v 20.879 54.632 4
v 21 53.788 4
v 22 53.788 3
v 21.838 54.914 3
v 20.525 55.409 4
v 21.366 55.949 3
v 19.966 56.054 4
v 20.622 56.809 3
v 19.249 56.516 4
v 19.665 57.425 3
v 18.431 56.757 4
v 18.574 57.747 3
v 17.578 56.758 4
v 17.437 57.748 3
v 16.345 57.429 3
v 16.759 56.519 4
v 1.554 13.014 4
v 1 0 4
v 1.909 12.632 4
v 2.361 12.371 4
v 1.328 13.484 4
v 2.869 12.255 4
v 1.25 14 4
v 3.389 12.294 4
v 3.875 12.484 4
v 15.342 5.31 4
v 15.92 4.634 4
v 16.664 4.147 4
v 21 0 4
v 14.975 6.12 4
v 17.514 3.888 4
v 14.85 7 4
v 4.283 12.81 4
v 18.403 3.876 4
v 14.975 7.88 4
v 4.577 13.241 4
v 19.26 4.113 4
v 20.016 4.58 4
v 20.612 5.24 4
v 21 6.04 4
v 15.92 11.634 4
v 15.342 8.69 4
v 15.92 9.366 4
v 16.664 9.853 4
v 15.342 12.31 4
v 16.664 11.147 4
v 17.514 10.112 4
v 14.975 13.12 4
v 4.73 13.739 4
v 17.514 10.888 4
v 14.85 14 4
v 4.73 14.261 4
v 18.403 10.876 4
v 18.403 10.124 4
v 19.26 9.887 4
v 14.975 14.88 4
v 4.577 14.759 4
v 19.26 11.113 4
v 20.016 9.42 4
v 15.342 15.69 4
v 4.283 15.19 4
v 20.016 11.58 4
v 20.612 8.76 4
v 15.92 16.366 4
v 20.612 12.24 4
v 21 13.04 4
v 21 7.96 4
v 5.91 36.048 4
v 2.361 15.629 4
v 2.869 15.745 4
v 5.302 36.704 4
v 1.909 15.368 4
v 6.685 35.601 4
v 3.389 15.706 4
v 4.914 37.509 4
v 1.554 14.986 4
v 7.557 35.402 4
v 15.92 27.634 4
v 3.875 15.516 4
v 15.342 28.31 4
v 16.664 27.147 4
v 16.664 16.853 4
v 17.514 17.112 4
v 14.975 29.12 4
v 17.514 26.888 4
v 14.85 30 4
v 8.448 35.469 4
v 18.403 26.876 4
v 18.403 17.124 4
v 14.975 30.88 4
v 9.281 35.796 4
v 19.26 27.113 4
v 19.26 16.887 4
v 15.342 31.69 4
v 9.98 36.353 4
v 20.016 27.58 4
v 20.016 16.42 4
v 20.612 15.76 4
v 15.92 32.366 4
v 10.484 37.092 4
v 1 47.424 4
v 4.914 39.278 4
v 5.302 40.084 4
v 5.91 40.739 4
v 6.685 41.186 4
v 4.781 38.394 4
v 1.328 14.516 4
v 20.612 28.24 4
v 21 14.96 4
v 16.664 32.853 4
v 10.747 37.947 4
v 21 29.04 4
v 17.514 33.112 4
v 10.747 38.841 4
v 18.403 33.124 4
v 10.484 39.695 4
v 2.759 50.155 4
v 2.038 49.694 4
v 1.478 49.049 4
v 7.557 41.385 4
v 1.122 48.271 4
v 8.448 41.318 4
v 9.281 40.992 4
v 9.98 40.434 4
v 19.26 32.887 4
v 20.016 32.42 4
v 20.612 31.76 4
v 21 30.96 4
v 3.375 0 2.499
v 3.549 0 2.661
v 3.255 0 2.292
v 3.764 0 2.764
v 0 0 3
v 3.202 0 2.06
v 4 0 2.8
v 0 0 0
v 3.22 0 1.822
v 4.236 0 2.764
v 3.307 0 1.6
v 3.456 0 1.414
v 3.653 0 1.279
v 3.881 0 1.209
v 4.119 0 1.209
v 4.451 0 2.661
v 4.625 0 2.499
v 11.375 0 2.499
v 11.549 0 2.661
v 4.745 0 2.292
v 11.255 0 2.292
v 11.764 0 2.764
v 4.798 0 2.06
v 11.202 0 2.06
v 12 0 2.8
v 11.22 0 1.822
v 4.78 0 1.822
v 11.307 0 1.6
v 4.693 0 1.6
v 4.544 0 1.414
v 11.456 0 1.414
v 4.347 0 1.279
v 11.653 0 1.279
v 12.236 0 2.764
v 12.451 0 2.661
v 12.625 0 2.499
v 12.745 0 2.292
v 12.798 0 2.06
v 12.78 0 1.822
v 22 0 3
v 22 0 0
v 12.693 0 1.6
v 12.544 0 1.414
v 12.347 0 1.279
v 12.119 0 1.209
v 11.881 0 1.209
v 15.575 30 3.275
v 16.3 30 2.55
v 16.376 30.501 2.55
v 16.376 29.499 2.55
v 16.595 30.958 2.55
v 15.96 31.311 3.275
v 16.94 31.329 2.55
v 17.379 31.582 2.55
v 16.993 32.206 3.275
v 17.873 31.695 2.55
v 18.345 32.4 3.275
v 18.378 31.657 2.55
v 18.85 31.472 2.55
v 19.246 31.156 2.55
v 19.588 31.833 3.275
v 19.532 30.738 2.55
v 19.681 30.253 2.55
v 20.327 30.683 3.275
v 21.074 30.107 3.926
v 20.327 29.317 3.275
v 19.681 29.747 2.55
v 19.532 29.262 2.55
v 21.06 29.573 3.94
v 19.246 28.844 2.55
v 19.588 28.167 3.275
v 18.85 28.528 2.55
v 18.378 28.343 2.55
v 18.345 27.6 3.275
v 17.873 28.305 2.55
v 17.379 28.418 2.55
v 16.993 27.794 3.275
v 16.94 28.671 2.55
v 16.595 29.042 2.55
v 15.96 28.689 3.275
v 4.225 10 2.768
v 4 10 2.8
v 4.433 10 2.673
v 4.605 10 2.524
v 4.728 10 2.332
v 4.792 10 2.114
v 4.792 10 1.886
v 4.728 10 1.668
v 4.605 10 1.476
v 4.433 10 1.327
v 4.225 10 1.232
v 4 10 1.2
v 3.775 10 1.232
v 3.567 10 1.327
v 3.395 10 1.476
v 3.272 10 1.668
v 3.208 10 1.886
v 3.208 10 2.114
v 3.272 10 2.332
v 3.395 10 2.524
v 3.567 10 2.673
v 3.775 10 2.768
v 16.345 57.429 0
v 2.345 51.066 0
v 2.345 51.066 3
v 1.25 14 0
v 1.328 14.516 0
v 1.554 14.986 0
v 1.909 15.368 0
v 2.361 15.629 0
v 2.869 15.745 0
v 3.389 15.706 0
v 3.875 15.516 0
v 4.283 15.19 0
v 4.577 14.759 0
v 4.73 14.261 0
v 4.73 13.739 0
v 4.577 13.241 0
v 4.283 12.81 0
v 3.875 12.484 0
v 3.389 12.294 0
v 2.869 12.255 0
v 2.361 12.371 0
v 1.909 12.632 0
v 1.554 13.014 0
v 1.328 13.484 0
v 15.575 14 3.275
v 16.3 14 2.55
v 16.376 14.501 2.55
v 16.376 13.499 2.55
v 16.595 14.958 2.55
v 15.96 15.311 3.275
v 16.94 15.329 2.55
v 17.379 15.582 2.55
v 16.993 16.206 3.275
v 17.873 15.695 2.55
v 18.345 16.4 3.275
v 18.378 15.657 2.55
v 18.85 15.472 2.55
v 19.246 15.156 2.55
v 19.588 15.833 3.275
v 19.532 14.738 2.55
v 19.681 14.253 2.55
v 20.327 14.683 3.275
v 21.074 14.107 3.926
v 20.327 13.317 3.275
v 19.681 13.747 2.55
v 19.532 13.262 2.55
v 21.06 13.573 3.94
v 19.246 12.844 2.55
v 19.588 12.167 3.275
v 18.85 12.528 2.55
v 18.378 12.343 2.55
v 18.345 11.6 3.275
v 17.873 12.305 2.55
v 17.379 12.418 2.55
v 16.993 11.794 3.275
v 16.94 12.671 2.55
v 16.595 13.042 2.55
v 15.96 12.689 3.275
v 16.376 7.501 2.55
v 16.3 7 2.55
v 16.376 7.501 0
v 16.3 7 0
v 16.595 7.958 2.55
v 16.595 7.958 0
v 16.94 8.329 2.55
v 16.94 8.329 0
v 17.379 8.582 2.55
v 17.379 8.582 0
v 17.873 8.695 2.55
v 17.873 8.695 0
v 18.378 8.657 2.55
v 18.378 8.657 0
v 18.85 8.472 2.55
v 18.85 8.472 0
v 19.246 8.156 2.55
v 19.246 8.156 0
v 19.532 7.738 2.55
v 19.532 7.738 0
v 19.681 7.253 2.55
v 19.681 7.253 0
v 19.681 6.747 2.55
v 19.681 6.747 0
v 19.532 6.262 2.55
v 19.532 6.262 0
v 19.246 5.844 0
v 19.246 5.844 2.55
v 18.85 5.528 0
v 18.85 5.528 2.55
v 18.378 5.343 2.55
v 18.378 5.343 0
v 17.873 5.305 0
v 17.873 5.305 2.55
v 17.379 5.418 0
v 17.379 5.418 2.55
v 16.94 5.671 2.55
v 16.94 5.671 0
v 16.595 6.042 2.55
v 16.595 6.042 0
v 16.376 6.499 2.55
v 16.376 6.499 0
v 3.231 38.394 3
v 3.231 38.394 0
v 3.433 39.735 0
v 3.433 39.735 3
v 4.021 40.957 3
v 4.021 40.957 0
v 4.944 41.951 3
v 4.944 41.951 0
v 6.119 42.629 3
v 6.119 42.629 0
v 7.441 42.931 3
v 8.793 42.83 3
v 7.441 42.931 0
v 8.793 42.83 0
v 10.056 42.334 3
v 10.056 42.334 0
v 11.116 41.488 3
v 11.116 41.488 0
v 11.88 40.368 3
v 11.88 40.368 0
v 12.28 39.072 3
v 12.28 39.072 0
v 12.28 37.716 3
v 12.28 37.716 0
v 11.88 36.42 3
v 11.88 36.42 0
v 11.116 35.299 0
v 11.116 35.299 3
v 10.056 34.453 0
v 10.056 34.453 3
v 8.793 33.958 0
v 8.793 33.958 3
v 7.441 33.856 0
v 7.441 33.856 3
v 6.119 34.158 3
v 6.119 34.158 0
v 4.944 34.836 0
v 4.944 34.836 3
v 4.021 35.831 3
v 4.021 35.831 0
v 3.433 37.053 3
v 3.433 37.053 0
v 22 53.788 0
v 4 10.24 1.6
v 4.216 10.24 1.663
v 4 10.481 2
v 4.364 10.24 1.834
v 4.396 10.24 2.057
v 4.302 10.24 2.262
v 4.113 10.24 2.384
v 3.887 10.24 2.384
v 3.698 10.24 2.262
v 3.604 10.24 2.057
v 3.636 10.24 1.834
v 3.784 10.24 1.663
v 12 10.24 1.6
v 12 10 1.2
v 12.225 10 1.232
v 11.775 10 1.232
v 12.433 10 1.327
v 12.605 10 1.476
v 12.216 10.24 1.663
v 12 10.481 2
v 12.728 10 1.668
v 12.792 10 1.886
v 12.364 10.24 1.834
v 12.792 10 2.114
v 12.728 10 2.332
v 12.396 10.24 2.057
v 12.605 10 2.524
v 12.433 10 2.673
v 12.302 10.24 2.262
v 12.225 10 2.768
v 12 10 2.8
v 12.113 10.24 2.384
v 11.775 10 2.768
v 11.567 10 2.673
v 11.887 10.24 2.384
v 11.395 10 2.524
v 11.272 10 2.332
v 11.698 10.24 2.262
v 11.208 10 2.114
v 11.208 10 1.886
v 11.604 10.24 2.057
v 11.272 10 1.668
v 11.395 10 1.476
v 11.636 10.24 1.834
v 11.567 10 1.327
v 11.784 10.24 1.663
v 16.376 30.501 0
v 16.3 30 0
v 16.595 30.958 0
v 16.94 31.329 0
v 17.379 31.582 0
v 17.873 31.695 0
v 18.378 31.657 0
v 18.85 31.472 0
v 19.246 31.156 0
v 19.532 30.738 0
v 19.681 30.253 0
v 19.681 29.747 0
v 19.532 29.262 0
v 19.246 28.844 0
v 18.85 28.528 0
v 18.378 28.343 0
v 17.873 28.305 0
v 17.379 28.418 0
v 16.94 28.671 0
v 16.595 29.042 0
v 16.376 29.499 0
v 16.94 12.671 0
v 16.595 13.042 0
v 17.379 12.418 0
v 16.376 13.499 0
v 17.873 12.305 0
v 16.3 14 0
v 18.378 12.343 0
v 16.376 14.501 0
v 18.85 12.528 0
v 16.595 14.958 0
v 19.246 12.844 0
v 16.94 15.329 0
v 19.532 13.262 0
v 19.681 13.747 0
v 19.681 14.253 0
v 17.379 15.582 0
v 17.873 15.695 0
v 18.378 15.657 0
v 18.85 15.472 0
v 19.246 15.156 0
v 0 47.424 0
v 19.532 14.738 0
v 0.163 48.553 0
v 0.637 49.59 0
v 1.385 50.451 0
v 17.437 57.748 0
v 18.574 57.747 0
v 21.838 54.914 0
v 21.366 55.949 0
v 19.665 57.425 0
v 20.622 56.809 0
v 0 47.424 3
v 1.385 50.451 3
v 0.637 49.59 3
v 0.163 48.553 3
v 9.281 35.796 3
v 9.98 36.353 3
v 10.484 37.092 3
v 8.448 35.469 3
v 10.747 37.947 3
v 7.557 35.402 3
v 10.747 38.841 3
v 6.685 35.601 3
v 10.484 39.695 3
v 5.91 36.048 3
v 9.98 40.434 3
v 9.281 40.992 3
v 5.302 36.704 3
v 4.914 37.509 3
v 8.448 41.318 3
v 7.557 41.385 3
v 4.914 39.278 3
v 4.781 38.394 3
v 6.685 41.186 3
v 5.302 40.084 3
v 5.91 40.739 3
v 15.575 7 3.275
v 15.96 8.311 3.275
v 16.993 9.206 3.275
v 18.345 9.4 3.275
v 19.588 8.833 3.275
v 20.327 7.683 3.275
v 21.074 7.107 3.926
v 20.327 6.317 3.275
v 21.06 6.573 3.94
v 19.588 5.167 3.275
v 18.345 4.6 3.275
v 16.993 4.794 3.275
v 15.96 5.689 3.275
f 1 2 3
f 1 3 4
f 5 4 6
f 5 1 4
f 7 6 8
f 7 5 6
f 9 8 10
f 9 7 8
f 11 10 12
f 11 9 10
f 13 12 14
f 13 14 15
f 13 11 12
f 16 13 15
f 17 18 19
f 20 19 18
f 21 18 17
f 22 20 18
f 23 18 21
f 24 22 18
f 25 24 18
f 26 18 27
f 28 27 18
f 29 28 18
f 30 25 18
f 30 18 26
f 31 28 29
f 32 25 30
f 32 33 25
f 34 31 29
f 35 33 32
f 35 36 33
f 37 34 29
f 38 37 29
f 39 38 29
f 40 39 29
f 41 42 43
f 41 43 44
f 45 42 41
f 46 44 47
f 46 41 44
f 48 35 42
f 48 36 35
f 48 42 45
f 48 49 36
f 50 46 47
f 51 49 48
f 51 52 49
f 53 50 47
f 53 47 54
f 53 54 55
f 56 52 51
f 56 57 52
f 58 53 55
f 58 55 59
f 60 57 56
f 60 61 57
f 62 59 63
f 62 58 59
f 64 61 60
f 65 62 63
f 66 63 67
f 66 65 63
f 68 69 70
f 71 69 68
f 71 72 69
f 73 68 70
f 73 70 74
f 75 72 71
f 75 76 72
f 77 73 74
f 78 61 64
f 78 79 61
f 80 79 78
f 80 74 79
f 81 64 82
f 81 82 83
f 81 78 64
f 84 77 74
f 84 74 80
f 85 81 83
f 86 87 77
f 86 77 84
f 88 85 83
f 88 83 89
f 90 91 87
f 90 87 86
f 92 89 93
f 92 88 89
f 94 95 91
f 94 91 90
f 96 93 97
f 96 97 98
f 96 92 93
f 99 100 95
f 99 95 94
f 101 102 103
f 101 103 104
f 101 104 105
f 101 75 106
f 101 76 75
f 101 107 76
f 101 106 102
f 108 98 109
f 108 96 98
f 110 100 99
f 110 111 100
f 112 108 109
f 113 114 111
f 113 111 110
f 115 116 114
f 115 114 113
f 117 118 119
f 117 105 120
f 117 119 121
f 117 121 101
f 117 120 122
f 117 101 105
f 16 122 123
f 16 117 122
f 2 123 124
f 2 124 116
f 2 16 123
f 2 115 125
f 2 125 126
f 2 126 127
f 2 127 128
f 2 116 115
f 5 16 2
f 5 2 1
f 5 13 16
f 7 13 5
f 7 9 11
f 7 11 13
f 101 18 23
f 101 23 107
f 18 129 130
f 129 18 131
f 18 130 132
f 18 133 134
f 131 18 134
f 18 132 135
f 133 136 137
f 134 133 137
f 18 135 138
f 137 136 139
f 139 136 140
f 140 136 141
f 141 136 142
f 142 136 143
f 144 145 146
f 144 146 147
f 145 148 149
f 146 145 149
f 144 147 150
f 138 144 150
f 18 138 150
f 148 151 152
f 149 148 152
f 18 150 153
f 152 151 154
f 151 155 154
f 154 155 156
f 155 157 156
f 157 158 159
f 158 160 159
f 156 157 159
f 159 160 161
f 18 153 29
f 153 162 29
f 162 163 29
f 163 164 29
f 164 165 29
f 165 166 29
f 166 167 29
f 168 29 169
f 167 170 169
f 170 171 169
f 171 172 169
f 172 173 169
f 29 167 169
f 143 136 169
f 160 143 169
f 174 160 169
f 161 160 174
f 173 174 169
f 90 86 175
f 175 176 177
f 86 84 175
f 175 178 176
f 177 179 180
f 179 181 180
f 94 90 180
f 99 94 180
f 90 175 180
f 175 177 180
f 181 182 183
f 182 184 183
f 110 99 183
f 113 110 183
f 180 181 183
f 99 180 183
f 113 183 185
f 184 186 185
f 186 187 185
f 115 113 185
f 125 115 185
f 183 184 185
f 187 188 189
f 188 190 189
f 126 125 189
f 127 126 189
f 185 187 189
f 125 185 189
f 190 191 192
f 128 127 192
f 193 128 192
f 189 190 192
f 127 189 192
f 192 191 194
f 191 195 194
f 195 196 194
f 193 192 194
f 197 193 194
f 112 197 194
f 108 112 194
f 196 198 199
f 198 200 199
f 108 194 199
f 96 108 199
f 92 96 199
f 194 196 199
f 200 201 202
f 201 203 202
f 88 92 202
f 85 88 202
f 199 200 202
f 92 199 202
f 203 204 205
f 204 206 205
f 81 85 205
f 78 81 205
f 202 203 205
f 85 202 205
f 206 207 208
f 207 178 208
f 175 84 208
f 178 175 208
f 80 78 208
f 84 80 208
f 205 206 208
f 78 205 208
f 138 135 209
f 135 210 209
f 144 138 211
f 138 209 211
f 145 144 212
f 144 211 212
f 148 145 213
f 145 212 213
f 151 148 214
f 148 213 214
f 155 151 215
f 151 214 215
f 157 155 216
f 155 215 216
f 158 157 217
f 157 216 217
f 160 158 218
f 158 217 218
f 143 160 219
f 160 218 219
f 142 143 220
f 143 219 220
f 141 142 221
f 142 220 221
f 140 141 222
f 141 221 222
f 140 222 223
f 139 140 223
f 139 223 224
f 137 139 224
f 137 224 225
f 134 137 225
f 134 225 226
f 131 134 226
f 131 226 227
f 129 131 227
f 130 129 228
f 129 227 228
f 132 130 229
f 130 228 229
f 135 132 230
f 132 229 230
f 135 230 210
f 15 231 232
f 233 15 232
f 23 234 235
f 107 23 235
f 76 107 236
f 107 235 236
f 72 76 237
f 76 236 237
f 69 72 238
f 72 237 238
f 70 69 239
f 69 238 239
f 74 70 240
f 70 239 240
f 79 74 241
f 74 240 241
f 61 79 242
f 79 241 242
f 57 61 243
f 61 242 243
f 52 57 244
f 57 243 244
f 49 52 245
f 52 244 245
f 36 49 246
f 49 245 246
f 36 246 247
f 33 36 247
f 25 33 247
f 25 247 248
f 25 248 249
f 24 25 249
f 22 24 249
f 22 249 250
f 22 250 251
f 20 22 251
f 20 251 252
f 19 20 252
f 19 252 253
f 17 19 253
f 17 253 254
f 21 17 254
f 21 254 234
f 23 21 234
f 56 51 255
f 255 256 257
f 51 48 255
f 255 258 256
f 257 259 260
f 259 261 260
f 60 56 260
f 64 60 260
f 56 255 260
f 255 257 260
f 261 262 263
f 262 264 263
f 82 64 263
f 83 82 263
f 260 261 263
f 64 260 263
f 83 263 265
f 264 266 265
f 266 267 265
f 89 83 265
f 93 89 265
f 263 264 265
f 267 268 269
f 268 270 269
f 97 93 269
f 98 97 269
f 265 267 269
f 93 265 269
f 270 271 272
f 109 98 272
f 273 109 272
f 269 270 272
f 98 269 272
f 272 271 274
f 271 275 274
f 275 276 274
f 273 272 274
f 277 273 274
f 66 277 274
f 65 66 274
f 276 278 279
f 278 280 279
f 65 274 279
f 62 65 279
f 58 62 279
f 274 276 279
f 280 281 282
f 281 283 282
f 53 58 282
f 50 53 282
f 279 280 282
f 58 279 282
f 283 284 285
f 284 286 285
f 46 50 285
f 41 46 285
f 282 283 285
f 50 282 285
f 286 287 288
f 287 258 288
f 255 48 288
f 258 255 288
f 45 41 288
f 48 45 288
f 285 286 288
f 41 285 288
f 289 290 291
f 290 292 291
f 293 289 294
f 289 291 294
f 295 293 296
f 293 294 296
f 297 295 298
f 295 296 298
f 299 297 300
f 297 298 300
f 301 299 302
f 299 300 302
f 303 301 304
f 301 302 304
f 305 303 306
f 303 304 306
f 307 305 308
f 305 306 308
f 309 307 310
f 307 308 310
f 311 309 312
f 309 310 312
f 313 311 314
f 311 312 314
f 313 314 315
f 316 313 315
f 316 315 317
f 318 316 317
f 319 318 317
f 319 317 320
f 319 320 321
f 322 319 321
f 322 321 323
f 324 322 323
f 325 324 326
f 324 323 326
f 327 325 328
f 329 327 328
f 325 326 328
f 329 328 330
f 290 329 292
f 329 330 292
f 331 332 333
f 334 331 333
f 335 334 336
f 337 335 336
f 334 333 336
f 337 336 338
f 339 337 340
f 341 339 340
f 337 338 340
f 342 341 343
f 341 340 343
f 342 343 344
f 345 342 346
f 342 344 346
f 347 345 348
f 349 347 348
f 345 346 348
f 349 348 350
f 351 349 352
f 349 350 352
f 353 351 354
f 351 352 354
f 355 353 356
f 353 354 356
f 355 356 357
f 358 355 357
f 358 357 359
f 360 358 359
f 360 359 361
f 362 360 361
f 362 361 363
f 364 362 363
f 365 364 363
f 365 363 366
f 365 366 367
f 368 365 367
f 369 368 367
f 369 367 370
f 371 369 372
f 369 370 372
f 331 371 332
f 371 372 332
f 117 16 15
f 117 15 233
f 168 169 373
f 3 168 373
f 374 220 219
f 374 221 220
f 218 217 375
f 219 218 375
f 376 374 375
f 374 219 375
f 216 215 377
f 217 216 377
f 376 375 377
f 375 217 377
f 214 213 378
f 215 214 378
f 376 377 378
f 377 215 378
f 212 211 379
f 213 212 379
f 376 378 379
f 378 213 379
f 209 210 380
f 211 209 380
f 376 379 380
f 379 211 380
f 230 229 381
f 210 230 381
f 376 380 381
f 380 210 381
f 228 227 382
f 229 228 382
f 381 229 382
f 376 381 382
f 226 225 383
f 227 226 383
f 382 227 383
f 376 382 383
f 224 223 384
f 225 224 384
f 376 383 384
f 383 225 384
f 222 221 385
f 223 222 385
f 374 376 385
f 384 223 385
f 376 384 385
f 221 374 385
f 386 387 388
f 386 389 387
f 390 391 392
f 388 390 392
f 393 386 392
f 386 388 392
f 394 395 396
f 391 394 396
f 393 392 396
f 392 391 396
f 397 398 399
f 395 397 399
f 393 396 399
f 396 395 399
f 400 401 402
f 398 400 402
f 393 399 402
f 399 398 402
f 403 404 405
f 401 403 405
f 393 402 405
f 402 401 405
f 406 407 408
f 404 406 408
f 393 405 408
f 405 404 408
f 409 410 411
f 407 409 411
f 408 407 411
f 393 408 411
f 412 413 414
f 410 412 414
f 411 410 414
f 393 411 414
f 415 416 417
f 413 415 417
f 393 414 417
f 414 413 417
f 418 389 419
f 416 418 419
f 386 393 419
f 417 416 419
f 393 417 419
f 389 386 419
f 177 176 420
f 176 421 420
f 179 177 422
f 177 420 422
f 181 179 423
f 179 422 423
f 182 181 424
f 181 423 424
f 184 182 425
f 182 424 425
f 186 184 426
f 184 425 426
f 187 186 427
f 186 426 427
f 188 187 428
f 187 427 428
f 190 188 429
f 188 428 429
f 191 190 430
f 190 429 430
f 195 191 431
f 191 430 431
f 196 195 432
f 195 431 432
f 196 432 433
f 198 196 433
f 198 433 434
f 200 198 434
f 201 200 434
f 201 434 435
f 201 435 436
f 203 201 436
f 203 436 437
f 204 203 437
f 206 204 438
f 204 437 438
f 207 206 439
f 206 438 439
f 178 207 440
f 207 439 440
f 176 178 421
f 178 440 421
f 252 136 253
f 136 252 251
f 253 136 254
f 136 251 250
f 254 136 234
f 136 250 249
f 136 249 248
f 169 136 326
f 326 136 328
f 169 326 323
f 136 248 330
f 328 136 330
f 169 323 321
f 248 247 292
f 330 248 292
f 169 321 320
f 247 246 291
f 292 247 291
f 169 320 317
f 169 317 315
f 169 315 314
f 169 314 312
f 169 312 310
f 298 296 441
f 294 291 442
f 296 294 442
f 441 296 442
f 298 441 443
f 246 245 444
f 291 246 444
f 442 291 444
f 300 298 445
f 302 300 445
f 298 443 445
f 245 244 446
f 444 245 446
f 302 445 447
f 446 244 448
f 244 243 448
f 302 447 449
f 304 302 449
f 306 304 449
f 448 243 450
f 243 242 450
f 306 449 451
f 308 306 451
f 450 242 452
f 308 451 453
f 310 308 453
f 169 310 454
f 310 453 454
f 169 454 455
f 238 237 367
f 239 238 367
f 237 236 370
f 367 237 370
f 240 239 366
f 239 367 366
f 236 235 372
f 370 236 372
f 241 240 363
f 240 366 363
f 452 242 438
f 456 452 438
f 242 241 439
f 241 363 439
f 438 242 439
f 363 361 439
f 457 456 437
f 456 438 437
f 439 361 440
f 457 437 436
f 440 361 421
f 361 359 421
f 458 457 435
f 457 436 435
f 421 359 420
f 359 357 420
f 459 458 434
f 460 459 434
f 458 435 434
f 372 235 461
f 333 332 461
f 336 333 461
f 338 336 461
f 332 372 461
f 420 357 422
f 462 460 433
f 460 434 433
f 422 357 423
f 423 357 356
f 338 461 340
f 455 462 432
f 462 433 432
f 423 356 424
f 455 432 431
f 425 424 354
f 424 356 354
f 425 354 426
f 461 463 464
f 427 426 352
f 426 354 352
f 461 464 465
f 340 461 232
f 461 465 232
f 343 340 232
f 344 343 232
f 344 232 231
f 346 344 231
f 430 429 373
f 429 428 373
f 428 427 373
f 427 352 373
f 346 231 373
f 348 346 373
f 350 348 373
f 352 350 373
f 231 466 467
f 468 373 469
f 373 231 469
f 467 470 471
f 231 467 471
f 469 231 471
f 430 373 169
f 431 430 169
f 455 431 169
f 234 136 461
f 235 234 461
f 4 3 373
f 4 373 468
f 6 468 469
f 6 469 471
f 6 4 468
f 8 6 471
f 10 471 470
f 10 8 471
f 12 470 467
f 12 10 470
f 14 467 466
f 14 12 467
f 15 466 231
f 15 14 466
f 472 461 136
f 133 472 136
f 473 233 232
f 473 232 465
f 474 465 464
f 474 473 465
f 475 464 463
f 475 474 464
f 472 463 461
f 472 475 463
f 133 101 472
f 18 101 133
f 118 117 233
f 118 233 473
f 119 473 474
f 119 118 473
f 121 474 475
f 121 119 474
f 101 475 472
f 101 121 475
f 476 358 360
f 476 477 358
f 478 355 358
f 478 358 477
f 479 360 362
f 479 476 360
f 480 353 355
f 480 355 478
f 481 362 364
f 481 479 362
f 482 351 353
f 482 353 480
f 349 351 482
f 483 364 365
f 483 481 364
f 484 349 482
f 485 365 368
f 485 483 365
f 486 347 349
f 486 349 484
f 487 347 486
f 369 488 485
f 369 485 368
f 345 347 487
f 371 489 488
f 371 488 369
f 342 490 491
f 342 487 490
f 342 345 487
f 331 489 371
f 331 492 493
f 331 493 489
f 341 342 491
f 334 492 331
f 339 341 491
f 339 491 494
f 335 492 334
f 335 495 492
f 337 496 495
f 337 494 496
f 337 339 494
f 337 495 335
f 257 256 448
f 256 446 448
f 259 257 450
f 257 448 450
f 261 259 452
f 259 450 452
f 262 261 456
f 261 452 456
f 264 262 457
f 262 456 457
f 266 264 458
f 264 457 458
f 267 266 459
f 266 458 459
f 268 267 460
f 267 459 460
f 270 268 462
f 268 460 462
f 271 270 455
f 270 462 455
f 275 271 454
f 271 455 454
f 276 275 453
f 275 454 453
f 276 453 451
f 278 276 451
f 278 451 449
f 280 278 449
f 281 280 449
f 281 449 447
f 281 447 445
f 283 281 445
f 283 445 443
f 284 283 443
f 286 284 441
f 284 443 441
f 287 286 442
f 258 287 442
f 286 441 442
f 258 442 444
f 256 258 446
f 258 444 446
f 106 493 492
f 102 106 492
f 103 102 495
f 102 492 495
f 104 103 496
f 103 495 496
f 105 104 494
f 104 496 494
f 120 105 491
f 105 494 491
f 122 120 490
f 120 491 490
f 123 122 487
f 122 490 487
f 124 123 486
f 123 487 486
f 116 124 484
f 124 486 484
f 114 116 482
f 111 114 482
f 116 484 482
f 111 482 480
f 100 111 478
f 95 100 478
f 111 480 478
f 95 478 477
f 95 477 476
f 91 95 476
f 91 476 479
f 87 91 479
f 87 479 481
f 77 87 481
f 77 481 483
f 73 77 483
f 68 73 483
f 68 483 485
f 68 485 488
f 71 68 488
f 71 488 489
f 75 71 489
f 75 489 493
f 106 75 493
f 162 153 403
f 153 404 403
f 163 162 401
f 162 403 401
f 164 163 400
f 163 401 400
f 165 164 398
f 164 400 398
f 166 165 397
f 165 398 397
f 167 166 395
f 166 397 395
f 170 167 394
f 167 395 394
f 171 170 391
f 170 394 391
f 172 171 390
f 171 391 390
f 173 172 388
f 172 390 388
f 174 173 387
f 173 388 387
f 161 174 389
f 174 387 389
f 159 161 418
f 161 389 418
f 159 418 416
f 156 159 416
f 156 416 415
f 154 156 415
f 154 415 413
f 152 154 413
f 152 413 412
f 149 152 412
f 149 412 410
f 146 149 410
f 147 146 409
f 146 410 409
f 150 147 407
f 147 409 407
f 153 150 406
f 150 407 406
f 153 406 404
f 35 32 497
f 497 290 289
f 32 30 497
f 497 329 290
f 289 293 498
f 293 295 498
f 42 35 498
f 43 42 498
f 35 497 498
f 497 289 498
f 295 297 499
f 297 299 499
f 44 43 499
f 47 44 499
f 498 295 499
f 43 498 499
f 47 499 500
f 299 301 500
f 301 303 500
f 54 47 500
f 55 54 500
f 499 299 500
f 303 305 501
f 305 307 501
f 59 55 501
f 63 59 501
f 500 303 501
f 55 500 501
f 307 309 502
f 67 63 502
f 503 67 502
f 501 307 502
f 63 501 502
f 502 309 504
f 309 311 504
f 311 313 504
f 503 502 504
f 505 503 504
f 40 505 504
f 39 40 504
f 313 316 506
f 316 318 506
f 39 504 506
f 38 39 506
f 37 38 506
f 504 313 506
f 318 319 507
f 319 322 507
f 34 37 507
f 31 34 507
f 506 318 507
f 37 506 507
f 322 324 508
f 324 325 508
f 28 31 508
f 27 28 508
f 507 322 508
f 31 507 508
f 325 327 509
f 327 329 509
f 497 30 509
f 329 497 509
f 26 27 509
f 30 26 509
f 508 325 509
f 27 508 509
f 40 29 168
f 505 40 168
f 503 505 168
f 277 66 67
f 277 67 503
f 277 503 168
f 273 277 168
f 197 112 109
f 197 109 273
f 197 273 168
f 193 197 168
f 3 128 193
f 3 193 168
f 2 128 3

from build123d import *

# Parameters (mm, degrees)
RESSALTO_EXTRUS_O1_DEPTH                             = 4
FILETE1_R                                            = 4
CHANFRO1_SIZE                                        = 1
FURO_DE_DI_METRO_6_0_6_1_D                           = 6
ESCAREADO_PARA_PARAFUSO_COM_CABE_A_ESCAR_D           = 3.4
ESCAREADO_PARA_PARAFUSO_COM_CABE_A_ESCAR_CSINK_D     = 6.3
ESCAREADO_PARA_PARAFUSO_COM_CABE_A_ESCAR_CSINK_ANGLE = 90
BROCA_DE_ROSQUEAR_PARA_TARRAXA_DE_M21_D              = 1.6
BROCA_DE_ROSQUEAR_PARA_TARRAXA_DE_M21_DEPTH          = 10
BROCA_DE_ROSQUEAR_PARA_TARRAXA_DE_M21_TIP            = 0.480688495
ESCAREADO_PARA_PARAFUSO_COM_CABE_A_E_2_D             = 3.4
ESCAREADO_PARA_PARAFUSO_COM_CABE_A_E_2_DEPTH         = 4
ESCAREADO_PARA_PARAFUSO_COM_CABE_A_E_2_CSINK_D       = 6.3
ESCAREADO_PARA_PARAFUSO_COM_CABE_A_E_2_CSINK_ANGLE   = 90
ESCAREADO_PARA_PARAFUSO_COM_CABE_A_E_2_TIP           = 1.021463052
ESBO_O10_R                                           = 4.55
CORTE_EXTRUS_O1_DEPTH                                = 3
FURO_DE_DI_METRO_3_5_3_5_1_D                         = 3.5


with BuildPart() as part:
    # Esboço1 → Ressalto-extrusão1 (new body)
    with BuildSketch(Plane.XY):
        Polygon((0, 0), (22, 0), (22, 60), (0, 50), align=None)
    extrude(amount=RESSALTO_EXTRUS_O1_DEPTH)

    # Filete1
    filete1_edges = [part.edges().sort_by_distance(p)[0] for p in [
        (0, 50, 2),
        (22, 60, 2),
    ]]
    fillet(filete1_edges, radius=FILETE1_R)

    # Chanfro1
    chanfro1_edges = [part.edges().sort_by_distance(p)[0] for p in [
        (22, 26.893991641, 4),
        (0, 23.712173459, 4),
        (9.344788223, 54.24763101, 4),
        (20.165542991, 57.151080598, 4),
        (0.636902684, 49.58988991, 4),
    ]]
    chamfer(chanfro1_edges, length=CHANFRO1_SIZE)

    # Furo de diâmetro Ø6.0 (6)1 (through all)
    with Locations(Plane(origin=(7.780869527, 38.393713373, 4), x_dir=(1, 0, 0), z_dir=(0, 0, 1))):
        with Locations((0, 0)):
            Hole(FURO_DE_DI_METRO_6_0_6_1_D / 2)

    # Escareado para parafuso com cabe_a escar (through all)
    with Locations(Plane(origin=(18, 7, 4), x_dir=(1, 0, 0), z_dir=(0, 0, 1))):
        with Locations((0, 0), (0, 7)):
            CounterSinkHole(ESCAREADO_PARA_PARAFUSO_COM_CABE_A_ESCAR_D / 2, ESCAREADO_PARA_PARAFUSO_COM_CABE_A_ESCAR_CSINK_D / 2, counter_sink_angle=ESCAREADO_PARA_PARAFUSO_COM_CABE_A_ESCAR_CSINK_ANGLE)

    # Broca de rosquear para tarraxa de M21
    with Locations(Plane(origin=(4, 0, 2), x_dir=(0, 0, -1), z_dir=(0, -1, 0))):
        with Locations((0, 0), (0, 8)):
            Hole(BROCA_DE_ROSQUEAR_PARA_TARRAXA_DE_M21_D / 2, depth=BROCA_DE_ROSQUEAR_PARA_TARRAXA_DE_M21_DEPTH)
            with Locations((0, 0, -(BROCA_DE_ROSQUEAR_PARA_TARRAXA_DE_M21_DEPTH + BROCA_DE_ROSQUEAR_PARA_TARRAXA_DE_M21_TIP / 2))):  # 118° drill point
                Cone(0, BROCA_DE_ROSQUEAR_PARA_TARRAXA_DE_M21_D / 2, BROCA_DE_ROSQUEAR_PARA_TARRAXA_DE_M21_TIP, mode=Mode.SUBTRACT)

    # Escareado para parafuso com cabe_a e 2
    with Locations(Plane(origin=(18, 30, 4), x_dir=(1, 0, 0), z_dir=(0, 0, 1))):
        with Locations((0, 0)):
            CounterSinkHole(ESCAREADO_PARA_PARAFUSO_COM_CABE_A_E_2_D / 2, ESCAREADO_PARA_PARAFUSO_COM_CABE_A_E_2_CSINK_D / 2, depth=ESCAREADO_PARA_PARAFUSO_COM_CABE_A_E_2_DEPTH, counter_sink_angle=ESCAREADO_PARA_PARAFUSO_COM_CABE_A_E_2_CSINK_ANGLE)
            with Locations((0, 0, -(ESCAREADO_PARA_PARAFUSO_COM_CABE_A_E_2_DEPTH + ESCAREADO_PARA_PARAFUSO_COM_CABE_A_E_2_TIP / 2))):  # 118° drill point
                Cone(0, ESCAREADO_PARA_PARAFUSO_COM_CABE_A_E_2_D / 2, ESCAREADO_PARA_PARAFUSO_COM_CABE_A_E_2_TIP, mode=Mode.SUBTRACT)

    # Esboço10 → Corte-extrusão1 (cut)
    with BuildSketch(Plane(origin=(0, 0, 0), x_dir=(-1, 0, 0), z_dir=(0, 0, -1))):
        with Locations((-7.780869527, 38.393713373)):
            Circle(ESBO_O10_R)
    extrude(amount=-CORTE_EXTRUS_O1_DEPTH, mode=Mode.SUBTRACT)

    # Furo de diâmetro Ø3.5 (3.5)1 (through all)
    with Locations(Plane(origin=(3, 14, 4), x_dir=(1, 0, 0), z_dir=(0, 0, 1))):
        with Locations((0, 0)):
            Hole(FURO_DE_DI_METRO_3_5_3_5_1_D / 2)


solid = part.part
